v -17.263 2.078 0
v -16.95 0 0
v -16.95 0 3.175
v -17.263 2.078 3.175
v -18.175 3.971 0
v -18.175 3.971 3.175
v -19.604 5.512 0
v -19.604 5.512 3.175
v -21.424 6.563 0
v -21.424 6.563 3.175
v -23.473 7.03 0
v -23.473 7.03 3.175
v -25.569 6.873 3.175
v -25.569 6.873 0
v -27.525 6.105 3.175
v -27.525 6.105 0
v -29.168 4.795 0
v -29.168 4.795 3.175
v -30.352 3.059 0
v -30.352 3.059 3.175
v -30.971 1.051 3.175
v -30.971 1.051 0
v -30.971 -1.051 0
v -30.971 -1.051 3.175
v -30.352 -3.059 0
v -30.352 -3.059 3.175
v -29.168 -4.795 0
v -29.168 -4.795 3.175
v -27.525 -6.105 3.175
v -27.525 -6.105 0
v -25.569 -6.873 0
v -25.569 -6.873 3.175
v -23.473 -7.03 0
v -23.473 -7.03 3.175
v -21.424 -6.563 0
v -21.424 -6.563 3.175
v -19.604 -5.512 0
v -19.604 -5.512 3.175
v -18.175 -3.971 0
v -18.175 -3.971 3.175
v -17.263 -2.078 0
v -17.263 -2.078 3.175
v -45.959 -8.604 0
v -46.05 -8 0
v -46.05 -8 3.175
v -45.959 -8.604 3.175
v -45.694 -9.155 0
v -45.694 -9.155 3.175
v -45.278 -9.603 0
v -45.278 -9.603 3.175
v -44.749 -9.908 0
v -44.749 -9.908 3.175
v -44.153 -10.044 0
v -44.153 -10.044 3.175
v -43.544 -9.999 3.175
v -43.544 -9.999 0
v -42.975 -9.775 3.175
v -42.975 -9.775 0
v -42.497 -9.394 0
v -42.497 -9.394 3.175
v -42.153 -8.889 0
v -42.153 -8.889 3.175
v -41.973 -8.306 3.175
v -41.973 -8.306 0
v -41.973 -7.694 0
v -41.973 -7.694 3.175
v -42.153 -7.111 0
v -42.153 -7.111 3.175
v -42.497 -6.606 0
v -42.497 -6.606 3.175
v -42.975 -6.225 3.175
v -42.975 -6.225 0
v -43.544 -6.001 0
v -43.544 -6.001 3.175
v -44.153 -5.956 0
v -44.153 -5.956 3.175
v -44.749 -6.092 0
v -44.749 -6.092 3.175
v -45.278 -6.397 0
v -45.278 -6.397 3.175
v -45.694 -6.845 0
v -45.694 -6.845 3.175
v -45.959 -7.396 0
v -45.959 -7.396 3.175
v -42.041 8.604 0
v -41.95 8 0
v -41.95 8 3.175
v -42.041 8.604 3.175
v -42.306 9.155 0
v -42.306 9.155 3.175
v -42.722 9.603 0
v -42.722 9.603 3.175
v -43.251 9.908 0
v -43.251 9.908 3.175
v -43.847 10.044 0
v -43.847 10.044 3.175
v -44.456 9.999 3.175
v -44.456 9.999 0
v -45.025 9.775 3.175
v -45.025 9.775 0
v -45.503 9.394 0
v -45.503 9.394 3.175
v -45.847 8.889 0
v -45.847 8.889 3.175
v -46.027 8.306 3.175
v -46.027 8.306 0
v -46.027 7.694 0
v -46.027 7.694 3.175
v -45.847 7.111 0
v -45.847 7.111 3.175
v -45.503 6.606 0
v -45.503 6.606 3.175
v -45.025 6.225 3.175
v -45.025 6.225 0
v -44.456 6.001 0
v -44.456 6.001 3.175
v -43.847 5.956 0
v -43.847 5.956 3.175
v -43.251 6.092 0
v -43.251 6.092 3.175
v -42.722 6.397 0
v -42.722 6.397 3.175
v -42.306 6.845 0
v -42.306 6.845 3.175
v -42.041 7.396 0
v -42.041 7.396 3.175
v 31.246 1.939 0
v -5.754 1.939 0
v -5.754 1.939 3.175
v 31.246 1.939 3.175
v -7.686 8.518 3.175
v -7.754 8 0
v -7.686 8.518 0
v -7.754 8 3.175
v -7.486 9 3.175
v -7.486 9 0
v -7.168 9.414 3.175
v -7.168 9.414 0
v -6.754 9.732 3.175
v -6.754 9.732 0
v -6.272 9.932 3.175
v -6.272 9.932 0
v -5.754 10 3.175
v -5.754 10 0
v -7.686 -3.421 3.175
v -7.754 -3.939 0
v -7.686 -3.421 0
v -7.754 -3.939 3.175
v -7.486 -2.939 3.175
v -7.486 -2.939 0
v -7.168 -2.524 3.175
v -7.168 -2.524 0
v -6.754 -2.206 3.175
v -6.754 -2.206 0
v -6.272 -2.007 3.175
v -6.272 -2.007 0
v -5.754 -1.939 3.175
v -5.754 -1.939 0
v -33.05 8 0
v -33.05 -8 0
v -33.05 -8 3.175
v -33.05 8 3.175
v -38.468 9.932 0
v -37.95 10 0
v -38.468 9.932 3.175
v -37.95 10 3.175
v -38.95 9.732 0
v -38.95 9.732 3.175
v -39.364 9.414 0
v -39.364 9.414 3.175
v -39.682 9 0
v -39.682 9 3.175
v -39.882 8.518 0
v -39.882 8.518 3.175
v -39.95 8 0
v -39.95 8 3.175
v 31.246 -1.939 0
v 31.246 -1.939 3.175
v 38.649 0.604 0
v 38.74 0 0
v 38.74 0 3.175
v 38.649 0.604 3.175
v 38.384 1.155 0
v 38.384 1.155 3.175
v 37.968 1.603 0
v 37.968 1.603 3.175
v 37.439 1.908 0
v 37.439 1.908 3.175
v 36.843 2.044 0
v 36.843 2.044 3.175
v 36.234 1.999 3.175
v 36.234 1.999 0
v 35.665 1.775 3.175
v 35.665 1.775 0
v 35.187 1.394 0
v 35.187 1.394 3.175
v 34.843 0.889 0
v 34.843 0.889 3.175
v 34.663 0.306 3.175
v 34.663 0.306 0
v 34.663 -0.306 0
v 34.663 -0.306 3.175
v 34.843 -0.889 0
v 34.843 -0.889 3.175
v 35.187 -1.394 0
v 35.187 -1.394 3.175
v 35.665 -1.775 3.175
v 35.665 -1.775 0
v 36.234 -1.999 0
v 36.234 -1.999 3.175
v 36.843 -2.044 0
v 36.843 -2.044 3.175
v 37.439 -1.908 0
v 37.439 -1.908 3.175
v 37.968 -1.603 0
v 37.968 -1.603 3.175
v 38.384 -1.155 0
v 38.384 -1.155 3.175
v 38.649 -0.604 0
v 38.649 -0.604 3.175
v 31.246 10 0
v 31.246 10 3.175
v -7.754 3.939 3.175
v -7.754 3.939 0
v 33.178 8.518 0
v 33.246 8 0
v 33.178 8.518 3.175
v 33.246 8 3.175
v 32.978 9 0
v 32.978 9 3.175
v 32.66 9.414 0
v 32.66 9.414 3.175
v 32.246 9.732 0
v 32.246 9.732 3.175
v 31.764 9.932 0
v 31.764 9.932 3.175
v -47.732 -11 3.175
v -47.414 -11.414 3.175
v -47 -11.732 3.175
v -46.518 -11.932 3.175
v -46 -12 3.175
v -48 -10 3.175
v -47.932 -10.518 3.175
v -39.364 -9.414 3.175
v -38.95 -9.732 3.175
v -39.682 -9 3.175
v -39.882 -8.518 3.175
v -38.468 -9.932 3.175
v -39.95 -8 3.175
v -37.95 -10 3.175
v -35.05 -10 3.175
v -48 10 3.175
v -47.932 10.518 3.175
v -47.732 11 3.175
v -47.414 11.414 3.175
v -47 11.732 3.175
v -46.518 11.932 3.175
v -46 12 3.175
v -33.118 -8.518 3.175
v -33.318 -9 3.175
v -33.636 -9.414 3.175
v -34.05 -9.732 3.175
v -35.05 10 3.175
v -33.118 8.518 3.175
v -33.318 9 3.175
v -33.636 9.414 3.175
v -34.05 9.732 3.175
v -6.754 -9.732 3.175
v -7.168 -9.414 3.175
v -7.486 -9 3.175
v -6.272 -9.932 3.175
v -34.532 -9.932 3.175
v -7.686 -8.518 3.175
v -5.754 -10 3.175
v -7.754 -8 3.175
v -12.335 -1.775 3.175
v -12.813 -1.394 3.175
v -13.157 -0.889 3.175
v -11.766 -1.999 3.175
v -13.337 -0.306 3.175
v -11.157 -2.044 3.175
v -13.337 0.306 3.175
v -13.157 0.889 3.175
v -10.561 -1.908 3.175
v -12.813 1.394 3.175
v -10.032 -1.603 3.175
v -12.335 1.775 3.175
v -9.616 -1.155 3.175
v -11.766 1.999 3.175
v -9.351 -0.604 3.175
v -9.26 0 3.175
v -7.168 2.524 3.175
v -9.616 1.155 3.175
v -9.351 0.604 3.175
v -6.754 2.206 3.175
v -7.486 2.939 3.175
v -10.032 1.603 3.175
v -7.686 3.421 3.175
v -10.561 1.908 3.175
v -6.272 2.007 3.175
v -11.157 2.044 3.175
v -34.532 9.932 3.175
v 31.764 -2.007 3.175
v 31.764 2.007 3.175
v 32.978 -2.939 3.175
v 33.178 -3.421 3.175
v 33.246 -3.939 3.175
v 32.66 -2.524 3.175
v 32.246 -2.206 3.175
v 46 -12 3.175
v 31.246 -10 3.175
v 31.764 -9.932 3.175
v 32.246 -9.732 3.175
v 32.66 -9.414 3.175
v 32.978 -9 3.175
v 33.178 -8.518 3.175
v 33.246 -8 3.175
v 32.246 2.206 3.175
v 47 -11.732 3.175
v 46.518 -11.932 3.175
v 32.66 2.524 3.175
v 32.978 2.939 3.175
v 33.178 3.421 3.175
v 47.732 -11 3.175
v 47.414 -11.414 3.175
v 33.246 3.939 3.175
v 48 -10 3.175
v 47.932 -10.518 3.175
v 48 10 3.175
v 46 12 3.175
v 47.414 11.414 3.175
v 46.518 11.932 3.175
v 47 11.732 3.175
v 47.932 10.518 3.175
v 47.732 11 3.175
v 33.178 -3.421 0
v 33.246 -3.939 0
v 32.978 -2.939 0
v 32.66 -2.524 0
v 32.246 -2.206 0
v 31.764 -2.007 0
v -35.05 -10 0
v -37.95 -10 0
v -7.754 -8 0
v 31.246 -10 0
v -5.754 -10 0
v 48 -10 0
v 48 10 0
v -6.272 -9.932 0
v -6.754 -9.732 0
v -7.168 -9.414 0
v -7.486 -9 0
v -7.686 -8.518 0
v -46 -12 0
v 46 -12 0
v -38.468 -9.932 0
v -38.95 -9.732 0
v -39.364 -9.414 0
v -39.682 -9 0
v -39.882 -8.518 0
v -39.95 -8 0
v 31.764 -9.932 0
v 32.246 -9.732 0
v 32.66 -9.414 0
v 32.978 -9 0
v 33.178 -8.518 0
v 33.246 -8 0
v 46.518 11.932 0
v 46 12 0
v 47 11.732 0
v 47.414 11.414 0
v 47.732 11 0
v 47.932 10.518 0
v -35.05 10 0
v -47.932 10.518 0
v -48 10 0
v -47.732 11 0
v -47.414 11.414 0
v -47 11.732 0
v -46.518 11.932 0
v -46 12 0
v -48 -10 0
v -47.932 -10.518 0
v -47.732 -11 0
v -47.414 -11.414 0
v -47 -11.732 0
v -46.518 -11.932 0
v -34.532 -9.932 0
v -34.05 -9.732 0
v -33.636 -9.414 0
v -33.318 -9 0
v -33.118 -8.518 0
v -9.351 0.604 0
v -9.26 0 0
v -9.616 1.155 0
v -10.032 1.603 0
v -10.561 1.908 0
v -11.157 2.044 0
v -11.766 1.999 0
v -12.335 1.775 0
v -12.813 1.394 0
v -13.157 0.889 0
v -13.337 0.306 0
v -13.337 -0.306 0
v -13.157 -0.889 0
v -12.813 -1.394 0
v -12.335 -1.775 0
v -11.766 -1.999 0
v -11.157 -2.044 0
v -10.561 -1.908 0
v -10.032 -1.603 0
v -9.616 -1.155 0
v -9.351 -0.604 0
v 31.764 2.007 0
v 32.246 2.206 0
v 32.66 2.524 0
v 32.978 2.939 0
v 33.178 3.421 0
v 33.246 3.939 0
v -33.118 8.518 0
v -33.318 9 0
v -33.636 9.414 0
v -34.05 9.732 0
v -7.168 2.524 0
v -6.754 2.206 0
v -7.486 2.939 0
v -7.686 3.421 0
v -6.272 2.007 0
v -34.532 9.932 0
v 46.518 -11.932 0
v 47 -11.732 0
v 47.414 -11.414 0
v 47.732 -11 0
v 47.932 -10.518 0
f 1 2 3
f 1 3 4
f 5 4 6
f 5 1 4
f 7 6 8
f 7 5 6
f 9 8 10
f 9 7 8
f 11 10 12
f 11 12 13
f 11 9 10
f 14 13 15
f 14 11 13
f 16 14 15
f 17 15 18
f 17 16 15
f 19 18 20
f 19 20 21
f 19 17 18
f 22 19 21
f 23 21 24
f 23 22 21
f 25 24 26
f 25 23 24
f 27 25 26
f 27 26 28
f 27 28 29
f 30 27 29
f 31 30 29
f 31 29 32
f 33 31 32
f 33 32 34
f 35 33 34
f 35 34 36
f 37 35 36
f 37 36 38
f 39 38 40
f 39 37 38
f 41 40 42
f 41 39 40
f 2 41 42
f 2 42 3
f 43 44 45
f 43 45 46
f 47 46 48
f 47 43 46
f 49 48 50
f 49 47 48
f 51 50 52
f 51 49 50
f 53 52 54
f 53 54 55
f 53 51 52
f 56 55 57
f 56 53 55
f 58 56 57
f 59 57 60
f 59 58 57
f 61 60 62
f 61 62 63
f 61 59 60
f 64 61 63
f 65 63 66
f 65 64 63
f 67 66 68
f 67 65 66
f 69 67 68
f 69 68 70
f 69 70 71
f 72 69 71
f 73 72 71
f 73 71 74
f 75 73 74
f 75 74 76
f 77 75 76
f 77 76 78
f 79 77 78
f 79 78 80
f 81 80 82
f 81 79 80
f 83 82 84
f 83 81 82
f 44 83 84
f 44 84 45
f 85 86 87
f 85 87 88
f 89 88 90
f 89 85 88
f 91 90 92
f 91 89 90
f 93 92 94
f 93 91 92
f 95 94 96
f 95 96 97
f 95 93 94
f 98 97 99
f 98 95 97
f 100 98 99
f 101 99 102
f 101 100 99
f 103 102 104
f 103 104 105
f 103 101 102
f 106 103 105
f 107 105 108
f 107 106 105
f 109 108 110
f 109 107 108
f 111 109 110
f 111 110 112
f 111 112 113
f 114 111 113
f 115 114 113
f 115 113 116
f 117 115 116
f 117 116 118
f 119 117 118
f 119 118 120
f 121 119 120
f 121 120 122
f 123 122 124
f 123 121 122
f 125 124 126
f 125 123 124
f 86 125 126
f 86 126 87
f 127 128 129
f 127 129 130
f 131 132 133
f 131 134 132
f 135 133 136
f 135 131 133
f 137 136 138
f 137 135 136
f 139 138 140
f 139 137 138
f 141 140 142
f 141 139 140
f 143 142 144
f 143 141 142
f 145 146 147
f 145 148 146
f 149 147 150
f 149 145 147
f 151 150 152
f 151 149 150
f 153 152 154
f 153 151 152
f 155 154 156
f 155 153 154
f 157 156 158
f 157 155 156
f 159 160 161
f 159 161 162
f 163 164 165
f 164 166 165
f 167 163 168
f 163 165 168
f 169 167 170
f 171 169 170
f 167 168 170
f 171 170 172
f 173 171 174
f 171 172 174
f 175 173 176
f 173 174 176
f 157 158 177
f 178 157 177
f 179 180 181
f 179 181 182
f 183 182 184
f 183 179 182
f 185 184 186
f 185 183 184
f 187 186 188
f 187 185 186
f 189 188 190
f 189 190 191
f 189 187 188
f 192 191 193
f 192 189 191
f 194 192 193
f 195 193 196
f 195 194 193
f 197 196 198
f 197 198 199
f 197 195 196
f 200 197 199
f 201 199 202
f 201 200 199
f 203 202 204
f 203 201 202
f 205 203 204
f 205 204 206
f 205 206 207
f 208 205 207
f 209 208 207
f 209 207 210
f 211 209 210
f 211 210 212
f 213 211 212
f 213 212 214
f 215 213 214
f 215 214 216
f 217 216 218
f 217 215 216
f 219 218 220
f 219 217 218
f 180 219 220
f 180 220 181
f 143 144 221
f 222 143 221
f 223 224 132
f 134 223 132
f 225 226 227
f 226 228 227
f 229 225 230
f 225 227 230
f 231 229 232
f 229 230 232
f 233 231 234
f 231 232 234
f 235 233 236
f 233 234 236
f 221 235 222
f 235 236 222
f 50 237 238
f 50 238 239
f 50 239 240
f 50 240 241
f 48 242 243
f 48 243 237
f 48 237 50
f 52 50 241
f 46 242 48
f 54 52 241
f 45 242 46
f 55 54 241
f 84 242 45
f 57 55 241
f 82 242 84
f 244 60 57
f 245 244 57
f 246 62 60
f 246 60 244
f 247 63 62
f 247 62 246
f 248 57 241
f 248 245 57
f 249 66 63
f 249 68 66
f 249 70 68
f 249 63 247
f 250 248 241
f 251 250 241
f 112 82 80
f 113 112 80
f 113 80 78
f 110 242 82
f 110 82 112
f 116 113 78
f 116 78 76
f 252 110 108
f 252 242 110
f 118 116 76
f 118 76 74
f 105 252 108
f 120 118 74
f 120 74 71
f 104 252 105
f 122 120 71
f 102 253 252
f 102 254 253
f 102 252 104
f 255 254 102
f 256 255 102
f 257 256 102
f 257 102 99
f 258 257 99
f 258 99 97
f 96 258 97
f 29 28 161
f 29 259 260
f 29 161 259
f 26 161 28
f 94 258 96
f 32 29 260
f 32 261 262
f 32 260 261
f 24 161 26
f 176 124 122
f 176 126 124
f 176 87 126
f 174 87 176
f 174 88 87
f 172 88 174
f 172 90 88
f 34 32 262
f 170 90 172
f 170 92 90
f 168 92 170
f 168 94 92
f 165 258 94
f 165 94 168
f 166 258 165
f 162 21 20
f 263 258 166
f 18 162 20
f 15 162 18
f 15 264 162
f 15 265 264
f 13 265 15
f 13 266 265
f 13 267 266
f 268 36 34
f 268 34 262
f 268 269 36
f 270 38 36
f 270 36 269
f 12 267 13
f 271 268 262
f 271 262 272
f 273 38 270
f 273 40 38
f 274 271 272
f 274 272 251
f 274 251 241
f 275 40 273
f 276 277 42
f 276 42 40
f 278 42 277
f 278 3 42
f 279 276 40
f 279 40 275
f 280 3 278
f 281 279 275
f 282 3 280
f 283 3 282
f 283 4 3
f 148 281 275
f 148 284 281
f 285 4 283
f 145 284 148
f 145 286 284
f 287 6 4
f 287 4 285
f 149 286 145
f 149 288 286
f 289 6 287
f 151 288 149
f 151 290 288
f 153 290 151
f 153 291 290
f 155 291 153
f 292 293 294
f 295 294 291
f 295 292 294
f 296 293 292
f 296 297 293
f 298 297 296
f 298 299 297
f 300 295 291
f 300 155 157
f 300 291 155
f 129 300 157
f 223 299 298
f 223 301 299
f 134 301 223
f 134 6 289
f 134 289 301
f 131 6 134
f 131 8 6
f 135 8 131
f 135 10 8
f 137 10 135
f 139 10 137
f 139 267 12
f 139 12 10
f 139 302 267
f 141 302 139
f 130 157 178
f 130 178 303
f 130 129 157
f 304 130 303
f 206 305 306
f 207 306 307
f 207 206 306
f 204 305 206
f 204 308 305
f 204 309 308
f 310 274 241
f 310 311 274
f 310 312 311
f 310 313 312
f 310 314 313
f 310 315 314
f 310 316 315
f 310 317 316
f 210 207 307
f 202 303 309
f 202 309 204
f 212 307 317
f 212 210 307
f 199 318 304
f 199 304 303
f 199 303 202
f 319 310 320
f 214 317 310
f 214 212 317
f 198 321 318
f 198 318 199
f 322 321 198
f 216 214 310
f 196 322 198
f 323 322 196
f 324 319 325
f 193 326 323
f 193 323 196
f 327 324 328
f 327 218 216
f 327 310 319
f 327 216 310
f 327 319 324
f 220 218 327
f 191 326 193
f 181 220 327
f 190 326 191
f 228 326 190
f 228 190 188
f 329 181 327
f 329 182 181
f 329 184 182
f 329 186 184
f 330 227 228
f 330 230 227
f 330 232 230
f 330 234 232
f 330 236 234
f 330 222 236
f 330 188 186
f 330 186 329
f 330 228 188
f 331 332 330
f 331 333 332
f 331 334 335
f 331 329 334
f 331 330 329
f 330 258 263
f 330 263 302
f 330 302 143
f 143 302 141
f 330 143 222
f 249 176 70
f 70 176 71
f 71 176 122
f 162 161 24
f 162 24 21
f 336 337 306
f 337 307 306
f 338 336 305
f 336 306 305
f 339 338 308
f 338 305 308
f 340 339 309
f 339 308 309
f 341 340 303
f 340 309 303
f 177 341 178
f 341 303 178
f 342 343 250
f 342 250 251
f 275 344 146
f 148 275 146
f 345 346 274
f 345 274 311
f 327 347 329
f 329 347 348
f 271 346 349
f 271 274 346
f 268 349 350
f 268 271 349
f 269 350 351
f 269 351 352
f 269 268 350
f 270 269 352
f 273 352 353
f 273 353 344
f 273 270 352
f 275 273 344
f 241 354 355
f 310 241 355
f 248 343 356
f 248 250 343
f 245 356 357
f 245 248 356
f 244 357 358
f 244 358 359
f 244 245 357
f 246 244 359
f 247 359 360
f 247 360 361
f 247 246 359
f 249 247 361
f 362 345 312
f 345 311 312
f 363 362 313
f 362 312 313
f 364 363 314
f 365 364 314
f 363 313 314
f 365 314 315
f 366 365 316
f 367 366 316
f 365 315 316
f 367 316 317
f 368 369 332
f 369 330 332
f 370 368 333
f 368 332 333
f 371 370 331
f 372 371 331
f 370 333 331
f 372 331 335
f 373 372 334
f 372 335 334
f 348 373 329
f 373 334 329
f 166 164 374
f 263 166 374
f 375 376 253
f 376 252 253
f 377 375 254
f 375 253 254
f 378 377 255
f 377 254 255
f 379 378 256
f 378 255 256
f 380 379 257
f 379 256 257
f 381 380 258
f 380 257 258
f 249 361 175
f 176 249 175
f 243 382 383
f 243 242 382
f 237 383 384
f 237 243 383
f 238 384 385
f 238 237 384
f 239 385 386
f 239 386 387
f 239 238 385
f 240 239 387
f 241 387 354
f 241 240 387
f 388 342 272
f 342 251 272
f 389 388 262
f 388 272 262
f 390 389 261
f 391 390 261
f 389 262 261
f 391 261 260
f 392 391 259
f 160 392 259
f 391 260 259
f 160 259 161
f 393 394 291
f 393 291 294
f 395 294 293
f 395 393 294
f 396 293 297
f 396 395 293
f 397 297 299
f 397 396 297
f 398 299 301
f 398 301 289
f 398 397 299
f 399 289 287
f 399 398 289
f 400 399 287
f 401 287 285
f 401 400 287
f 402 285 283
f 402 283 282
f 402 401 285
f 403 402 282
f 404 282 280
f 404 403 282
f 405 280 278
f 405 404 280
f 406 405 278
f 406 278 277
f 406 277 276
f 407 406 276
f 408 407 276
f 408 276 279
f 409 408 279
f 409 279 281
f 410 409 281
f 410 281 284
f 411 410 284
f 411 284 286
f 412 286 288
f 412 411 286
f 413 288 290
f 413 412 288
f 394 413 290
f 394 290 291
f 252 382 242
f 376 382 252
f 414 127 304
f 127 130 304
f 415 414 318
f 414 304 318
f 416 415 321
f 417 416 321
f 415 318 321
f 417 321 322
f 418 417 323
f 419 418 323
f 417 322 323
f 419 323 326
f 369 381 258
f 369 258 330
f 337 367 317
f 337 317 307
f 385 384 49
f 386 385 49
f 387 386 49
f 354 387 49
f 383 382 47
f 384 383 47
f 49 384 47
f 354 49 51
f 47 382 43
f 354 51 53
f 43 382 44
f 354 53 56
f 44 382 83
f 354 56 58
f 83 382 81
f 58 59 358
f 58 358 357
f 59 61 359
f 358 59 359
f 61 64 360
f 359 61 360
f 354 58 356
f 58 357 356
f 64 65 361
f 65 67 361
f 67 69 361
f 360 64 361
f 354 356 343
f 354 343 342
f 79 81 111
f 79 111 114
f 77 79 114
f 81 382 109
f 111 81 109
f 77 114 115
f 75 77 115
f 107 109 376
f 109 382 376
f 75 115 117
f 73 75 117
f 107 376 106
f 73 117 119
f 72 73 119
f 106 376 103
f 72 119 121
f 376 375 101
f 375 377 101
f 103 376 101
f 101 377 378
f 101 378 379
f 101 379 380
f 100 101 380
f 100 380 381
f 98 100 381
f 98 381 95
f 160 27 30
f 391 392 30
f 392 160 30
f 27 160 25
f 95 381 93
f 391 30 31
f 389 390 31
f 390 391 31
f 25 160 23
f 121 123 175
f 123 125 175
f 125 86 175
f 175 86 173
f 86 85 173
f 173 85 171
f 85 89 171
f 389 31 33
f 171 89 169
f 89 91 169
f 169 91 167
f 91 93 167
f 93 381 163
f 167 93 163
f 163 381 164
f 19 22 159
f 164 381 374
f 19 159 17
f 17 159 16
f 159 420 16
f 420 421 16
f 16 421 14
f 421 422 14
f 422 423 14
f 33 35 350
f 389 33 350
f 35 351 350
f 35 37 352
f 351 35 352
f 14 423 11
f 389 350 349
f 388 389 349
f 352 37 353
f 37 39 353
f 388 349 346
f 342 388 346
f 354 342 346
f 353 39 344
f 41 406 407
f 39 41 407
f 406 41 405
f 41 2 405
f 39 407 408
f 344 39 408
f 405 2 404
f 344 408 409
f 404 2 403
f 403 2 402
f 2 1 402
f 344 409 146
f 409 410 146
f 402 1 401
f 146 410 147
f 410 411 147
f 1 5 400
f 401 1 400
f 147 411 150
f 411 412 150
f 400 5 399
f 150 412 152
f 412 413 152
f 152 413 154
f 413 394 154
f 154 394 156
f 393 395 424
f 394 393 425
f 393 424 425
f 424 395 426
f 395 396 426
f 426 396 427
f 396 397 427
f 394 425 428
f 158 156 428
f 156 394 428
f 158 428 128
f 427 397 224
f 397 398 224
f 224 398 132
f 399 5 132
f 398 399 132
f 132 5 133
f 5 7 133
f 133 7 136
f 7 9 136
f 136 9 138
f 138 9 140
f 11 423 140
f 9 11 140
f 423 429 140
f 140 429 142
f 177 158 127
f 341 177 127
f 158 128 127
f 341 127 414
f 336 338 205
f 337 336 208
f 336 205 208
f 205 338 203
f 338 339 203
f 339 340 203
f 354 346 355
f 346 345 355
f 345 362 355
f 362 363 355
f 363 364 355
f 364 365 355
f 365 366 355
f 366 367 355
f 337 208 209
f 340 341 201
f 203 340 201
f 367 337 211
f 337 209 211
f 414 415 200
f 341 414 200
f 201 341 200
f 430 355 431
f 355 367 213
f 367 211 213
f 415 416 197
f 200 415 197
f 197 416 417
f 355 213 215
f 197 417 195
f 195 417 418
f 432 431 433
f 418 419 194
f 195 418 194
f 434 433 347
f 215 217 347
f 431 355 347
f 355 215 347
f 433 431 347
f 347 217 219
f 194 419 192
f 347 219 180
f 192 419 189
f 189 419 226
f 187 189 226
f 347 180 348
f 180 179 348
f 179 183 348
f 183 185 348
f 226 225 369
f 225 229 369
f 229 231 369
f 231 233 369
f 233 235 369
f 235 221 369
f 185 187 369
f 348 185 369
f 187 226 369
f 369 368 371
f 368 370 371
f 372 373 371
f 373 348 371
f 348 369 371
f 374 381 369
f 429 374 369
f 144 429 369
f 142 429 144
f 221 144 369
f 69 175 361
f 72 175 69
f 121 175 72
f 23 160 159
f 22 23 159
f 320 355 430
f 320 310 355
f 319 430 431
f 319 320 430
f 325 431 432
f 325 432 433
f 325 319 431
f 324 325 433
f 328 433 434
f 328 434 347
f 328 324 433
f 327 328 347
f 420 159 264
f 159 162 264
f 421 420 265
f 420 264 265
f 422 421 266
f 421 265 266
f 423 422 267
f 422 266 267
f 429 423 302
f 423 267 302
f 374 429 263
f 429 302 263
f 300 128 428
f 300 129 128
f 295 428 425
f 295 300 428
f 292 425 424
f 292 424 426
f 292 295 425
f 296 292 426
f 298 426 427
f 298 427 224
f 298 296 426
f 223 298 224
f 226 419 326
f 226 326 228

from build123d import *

# Parameters (mm, degrees)
SKETCH1_W           = 96
SKETCH1_H           = 24
SKETCH1_R           = 7.05
SKETCH1_R_2         = 2.05
SKETCH1_W_2         = 41
SKETCH1_H_2         = 8.061482978
SKETCH1_W_3         = 6.9
SKETCH1_H_3         = 20
BOSS_EXTRUDE1_DEPTH = 3.175
FILLET1_R           = 2


with BuildPart() as part:
    # Sketch1 → Boss-Extrude1 (new body)
    with BuildSketch(Plane.XY):
        Rectangle(SKETCH1_W, SKETCH1_H)
        with Locations((-24, 0)):
            Circle(SKETCH1_R, mode=Mode.SUBTRACT)
        with Locations((-11.31, 0)):
            Circle(SKETCH1_R_2, mode=Mode.SUBTRACT)
        with Locations((36.69, 0)):
            Circle(SKETCH1_R_2, mode=Mode.SUBTRACT)
        with Locations((-44, 8)):
            Circle(SKETCH1_R_2, mode=Mode.SUBTRACT)
        with Locations(Location((-44, -8, 0), (0, 0, 180))):
            Circle(SKETCH1_R_2, mode=Mode.SUBTRACT)
        with Locations((12.745931911, -5.969258511)):
            Rectangle(SKETCH1_W_2, SKETCH1_H_2, mode=Mode.SUBTRACT)
        with Locations((12.745931911, 5.969258511)):
            Rectangle(SKETCH1_W_2, SKETCH1_H_2, mode=Mode.SUBTRACT)
        with Locations((-36.5, 0)):
            Rectangle(SKETCH1_W_3, SKETCH1_H_3, mode=Mode.SUBTRACT)
    extrude(amount=BOSS_EXTRUDE1_DEPTH)

    # Fillet1
    fillet1_edges = [part.edges().sort_by_distance(p)[0] for p in [
        (-7.754068089, 10, 1.5875),
        (-7.754068089, 1.938517022, 1.5875),
        (33.245931911, 1.938517022, 1.5875),
        (33.245931911, 10, 1.5875),
        (-7.754068089, -1.938517022, 1.5875),
        (-7.754068089, -10, 1.5875),
        (33.245931911, -10, 1.5875),
        (33.245931911, -1.938517022, 1.5875),
        (-39.95, 10, 1.5875),
        (-39.95, -10, 1.5875),
        (-33.05, -10, 1.5875),
        (-33.05, 10, 1.5875),
        (-48, 12, 1.5875),
        (48, 12, 1.5875),
        (48, -12, 1.5875),
        (-48, -12, 1.5875),
    ]]
    fillet(fillet1_edges, radius=FILLET1_R)


solid = part.part
